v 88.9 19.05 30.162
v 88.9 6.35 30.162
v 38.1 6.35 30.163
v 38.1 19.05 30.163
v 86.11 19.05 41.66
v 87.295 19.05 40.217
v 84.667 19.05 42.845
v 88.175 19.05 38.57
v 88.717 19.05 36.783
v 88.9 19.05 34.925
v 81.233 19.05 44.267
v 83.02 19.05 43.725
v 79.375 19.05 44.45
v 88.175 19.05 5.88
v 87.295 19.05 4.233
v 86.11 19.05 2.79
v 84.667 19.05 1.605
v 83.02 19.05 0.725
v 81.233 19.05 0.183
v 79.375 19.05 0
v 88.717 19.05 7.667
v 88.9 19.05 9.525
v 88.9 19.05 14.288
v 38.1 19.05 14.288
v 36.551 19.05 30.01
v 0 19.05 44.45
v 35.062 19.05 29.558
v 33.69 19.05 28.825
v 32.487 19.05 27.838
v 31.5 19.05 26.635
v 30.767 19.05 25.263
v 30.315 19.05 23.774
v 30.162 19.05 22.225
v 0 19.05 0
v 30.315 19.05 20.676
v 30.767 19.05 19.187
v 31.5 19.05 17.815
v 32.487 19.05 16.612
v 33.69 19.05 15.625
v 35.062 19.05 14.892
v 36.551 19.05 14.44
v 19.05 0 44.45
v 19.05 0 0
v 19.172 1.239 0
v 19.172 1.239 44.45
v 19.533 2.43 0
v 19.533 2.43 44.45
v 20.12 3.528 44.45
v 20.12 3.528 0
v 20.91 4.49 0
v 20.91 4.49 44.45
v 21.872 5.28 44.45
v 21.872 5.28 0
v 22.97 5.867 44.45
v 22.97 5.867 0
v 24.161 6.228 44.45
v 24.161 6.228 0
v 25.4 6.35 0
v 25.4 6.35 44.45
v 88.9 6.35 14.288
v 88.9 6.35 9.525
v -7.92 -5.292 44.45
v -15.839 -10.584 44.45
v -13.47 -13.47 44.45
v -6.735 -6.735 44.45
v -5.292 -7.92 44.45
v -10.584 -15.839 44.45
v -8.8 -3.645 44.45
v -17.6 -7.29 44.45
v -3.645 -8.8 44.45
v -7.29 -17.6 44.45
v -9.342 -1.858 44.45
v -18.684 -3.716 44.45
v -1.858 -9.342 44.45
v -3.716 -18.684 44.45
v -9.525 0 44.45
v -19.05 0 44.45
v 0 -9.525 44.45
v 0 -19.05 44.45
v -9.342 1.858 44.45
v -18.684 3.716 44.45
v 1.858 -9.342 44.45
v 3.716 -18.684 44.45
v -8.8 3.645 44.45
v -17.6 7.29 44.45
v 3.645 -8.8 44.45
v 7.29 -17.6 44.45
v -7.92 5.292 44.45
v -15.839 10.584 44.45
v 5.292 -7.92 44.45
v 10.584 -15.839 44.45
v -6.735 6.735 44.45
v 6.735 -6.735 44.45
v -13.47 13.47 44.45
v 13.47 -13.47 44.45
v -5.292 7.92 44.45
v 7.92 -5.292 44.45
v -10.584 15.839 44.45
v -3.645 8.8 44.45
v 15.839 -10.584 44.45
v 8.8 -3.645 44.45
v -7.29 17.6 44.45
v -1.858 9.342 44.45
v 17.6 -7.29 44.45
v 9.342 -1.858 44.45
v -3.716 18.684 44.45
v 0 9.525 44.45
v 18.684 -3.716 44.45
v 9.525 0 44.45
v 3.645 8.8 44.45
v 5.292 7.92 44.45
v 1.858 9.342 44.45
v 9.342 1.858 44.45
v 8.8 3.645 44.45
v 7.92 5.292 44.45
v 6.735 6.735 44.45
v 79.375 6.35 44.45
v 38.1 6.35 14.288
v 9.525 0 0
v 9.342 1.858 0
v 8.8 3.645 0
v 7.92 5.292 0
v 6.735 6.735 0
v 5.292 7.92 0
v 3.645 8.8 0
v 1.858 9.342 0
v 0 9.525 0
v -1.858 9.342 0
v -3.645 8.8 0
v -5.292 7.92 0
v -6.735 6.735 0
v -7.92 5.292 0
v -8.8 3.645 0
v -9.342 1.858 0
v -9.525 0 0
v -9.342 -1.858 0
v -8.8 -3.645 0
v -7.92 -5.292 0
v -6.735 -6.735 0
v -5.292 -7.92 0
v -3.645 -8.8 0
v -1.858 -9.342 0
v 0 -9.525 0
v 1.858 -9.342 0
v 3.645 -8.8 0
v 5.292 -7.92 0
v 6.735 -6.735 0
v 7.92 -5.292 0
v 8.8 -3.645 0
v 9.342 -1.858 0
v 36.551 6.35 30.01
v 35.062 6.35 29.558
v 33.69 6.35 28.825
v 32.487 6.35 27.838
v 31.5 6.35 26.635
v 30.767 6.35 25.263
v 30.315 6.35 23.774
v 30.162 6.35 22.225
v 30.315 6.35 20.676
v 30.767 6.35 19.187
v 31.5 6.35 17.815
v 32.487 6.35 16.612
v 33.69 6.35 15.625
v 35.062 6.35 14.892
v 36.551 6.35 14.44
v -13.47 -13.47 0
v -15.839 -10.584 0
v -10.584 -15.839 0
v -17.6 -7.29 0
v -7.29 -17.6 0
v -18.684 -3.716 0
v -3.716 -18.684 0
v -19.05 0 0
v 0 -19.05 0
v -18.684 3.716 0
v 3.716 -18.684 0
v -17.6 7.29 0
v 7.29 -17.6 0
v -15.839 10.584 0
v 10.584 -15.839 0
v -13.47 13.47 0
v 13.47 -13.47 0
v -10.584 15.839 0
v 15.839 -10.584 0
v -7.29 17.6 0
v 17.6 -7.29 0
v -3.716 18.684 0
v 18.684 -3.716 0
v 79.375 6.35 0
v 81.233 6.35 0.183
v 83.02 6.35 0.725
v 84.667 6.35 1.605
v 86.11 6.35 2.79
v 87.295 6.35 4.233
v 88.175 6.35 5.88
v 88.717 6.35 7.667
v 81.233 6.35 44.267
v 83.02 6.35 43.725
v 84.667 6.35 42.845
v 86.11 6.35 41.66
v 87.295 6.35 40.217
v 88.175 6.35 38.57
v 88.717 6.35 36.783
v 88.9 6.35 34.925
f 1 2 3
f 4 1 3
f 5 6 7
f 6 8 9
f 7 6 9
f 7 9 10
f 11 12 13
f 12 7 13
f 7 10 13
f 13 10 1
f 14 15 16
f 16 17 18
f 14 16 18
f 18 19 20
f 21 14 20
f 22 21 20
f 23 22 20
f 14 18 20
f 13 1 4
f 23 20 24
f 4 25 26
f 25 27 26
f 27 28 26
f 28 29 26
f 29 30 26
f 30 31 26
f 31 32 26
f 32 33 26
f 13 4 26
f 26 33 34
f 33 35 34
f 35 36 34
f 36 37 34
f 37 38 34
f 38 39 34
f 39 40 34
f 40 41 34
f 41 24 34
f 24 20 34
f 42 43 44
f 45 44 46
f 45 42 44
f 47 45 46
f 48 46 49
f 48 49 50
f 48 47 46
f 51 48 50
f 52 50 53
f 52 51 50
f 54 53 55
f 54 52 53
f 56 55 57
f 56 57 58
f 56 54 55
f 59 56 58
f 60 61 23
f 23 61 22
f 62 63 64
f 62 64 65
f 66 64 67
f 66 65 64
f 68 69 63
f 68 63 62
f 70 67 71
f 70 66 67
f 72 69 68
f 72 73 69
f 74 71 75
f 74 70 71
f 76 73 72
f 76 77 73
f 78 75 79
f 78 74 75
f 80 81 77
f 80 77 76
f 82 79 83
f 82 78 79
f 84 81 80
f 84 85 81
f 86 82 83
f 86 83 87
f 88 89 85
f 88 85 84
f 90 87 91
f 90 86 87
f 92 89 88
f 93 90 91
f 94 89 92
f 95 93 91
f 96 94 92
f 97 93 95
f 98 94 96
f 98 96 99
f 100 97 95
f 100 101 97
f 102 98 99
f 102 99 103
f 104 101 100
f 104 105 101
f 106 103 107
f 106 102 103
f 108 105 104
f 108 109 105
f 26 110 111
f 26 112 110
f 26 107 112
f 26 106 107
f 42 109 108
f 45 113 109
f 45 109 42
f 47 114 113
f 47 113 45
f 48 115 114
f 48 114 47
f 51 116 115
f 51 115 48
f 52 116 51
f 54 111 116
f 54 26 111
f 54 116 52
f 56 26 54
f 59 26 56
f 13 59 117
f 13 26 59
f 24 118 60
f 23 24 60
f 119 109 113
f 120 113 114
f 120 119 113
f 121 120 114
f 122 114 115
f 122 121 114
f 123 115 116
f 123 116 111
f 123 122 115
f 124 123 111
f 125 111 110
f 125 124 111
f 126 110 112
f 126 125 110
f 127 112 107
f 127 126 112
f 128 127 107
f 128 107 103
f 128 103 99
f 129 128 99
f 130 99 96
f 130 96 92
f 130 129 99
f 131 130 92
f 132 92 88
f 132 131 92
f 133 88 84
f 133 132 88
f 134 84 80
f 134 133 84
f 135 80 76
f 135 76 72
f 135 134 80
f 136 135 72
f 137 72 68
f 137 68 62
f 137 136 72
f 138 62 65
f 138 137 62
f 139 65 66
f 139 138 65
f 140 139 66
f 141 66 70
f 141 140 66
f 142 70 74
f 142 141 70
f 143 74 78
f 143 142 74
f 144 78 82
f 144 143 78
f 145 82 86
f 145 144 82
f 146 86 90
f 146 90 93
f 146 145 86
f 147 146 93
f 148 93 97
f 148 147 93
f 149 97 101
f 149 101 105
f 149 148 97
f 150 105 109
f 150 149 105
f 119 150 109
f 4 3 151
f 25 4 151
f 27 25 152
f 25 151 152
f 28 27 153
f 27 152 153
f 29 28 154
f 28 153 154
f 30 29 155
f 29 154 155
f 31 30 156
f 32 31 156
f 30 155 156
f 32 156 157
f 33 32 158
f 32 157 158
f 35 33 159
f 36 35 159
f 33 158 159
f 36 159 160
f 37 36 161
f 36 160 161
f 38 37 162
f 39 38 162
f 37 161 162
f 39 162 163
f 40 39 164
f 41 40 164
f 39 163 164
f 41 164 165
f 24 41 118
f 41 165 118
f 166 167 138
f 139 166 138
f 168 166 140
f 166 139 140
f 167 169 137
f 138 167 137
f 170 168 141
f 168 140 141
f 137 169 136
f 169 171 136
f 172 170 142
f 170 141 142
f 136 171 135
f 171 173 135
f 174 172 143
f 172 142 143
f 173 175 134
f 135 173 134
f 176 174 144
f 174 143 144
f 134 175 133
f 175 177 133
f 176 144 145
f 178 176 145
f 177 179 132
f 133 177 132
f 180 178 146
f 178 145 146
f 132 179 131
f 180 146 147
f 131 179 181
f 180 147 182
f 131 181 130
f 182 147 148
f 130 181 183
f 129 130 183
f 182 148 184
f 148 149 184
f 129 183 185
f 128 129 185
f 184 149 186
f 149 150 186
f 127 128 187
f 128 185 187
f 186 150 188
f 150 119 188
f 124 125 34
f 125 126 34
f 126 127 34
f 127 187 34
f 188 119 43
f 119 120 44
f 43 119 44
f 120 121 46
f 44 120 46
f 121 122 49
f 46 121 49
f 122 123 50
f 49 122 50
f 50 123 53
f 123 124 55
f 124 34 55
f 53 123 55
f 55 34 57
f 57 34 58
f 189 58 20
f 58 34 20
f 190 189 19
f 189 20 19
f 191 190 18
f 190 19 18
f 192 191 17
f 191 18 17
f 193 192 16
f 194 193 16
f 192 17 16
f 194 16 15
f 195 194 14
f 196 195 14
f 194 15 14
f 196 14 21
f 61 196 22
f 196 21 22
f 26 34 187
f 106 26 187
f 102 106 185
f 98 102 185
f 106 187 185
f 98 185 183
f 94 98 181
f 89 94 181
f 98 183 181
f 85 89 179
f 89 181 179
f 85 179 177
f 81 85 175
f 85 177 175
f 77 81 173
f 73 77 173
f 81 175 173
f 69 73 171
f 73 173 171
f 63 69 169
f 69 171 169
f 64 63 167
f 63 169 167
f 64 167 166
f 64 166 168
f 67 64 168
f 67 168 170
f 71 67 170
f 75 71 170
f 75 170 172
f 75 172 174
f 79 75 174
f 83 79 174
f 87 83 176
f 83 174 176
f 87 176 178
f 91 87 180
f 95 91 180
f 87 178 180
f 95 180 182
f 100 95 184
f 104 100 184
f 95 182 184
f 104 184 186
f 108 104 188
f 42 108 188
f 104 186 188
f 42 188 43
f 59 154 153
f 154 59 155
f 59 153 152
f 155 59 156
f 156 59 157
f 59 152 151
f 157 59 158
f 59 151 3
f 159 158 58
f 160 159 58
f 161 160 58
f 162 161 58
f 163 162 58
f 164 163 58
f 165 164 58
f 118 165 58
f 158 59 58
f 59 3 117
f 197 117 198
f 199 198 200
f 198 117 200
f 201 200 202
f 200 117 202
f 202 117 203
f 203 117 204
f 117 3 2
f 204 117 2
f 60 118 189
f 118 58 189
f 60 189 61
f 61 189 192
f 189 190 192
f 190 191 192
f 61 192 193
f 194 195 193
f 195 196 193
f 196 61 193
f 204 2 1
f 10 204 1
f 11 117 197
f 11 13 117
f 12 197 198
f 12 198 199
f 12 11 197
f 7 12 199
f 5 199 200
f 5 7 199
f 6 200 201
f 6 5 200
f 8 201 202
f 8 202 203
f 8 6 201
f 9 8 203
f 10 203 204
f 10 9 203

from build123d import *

# Parameters (mm, degrees)
F0_R     = 9.525
F1_DEPTH = 44.45
F2_R     = 6.34999
F4_DEPTH = 12.7
F5_R     = 9.525


# Not quite as in the source:
# - a fillet or chamfer is up to 0.001 mm smaller than in the source, because OpenCascade refuses the exact size


with BuildPart() as f1:
    # F0 (on Top) → F1 (new body)
    with BuildSketch(Plane.XY):
        with BuildLine():
            ThreePointArc((0, 19.05), (-13.4703841816, -13.4703841816), (19.05, 0))
            Line((19.05, 0), (19.05, 6.35))
            Line((19.05, 6.35), (17.9605122421, 6.35))
            ThreePointArc((17.9605122421, 6.35), (10.9985226281, 15.5542598667), (0, 19.05))
        make_face()
        Circle(F0_R, mode=Mode.SUBTRACT)
        with BuildLine():
            Line((38.1, 19.05), (0, 19.05))
            ThreePointArc((0, 19.05), (10.9985226281, 15.5542598667), (17.9605122421, 6.35))
            Line((17.9605122421, 6.35), (19.05, 6.35))
            Line((19.05, 6.35), (38.1, 6.35))
            Line((38.1, 6.35), (88.9, 6.35))
            Line((88.9, 6.35), (88.9, 19.05))
            Line((88.9, 19.05), (38.1, 19.05))
        make_face()
    extrude(amount=F1_DEPTH)

    # F2 (radius 6.35 in the source; OpenCascade refuses exactly that, so slightly less here)
    f2_edges = [f1.edges().sort_by_distance(p)[0] for p in [
        (19.05, 6.35, 22.225),
    ]]
    fillet(f2_edges, radius=F2_R)

    # F3 (on face) → F4 (cut)
    with BuildSketch(Plane.XZ.offset(-6.35)):
        with BuildLine():
            Line((88.9, 14.2875), (88.9, 30.1625))
            Line((88.9, 30.1625), (38.1, 30.1625))
            ThreePointArc((38.1, 30.1625), (43.7126600757, 27.8376600757), (46.0375, 22.225))
            ThreePointArc((46.0375, 22.225), (43.7126600757, 16.6123399243), (38.1, 14.2875))
            Line((38.1, 14.2875), (88.9, 14.2875))
        make_face()
        with BuildLine():
            ThreePointArc((46.0375, 22.225), (43.7126600757, 27.8376600757), (38.1, 30.1625))
            Line((38.1, 30.1625), (38.1, 22.225))
            Line((38.1, 22.225), (38.1, 14.2875))
            ThreePointArc((38.1, 14.2875), (43.7126600757, 16.6123399243), (46.0375, 22.225))
        make_face()
        with BuildLine():
            Line((38.1, 22.225), (38.1, 30.1625))
            ThreePointArc((38.1, 30.1625), (30.1625, 22.225), (38.1, 14.2875))
            Line((38.1, 14.2875), (38.1, 22.225))
        make_face()
    extrude(amount=-F4_DEPTH, mode=Mode.SUBTRACT)

    # F5
    f5_edges = [f1.edges().sort_by_distance(p)[0] for p in [
        (88.9, 12.7, 44.45),
        (88.9, 12.7, 0),
    ]]
    fillet(f5_edges, radius=F5_R)


solid = f1.part
